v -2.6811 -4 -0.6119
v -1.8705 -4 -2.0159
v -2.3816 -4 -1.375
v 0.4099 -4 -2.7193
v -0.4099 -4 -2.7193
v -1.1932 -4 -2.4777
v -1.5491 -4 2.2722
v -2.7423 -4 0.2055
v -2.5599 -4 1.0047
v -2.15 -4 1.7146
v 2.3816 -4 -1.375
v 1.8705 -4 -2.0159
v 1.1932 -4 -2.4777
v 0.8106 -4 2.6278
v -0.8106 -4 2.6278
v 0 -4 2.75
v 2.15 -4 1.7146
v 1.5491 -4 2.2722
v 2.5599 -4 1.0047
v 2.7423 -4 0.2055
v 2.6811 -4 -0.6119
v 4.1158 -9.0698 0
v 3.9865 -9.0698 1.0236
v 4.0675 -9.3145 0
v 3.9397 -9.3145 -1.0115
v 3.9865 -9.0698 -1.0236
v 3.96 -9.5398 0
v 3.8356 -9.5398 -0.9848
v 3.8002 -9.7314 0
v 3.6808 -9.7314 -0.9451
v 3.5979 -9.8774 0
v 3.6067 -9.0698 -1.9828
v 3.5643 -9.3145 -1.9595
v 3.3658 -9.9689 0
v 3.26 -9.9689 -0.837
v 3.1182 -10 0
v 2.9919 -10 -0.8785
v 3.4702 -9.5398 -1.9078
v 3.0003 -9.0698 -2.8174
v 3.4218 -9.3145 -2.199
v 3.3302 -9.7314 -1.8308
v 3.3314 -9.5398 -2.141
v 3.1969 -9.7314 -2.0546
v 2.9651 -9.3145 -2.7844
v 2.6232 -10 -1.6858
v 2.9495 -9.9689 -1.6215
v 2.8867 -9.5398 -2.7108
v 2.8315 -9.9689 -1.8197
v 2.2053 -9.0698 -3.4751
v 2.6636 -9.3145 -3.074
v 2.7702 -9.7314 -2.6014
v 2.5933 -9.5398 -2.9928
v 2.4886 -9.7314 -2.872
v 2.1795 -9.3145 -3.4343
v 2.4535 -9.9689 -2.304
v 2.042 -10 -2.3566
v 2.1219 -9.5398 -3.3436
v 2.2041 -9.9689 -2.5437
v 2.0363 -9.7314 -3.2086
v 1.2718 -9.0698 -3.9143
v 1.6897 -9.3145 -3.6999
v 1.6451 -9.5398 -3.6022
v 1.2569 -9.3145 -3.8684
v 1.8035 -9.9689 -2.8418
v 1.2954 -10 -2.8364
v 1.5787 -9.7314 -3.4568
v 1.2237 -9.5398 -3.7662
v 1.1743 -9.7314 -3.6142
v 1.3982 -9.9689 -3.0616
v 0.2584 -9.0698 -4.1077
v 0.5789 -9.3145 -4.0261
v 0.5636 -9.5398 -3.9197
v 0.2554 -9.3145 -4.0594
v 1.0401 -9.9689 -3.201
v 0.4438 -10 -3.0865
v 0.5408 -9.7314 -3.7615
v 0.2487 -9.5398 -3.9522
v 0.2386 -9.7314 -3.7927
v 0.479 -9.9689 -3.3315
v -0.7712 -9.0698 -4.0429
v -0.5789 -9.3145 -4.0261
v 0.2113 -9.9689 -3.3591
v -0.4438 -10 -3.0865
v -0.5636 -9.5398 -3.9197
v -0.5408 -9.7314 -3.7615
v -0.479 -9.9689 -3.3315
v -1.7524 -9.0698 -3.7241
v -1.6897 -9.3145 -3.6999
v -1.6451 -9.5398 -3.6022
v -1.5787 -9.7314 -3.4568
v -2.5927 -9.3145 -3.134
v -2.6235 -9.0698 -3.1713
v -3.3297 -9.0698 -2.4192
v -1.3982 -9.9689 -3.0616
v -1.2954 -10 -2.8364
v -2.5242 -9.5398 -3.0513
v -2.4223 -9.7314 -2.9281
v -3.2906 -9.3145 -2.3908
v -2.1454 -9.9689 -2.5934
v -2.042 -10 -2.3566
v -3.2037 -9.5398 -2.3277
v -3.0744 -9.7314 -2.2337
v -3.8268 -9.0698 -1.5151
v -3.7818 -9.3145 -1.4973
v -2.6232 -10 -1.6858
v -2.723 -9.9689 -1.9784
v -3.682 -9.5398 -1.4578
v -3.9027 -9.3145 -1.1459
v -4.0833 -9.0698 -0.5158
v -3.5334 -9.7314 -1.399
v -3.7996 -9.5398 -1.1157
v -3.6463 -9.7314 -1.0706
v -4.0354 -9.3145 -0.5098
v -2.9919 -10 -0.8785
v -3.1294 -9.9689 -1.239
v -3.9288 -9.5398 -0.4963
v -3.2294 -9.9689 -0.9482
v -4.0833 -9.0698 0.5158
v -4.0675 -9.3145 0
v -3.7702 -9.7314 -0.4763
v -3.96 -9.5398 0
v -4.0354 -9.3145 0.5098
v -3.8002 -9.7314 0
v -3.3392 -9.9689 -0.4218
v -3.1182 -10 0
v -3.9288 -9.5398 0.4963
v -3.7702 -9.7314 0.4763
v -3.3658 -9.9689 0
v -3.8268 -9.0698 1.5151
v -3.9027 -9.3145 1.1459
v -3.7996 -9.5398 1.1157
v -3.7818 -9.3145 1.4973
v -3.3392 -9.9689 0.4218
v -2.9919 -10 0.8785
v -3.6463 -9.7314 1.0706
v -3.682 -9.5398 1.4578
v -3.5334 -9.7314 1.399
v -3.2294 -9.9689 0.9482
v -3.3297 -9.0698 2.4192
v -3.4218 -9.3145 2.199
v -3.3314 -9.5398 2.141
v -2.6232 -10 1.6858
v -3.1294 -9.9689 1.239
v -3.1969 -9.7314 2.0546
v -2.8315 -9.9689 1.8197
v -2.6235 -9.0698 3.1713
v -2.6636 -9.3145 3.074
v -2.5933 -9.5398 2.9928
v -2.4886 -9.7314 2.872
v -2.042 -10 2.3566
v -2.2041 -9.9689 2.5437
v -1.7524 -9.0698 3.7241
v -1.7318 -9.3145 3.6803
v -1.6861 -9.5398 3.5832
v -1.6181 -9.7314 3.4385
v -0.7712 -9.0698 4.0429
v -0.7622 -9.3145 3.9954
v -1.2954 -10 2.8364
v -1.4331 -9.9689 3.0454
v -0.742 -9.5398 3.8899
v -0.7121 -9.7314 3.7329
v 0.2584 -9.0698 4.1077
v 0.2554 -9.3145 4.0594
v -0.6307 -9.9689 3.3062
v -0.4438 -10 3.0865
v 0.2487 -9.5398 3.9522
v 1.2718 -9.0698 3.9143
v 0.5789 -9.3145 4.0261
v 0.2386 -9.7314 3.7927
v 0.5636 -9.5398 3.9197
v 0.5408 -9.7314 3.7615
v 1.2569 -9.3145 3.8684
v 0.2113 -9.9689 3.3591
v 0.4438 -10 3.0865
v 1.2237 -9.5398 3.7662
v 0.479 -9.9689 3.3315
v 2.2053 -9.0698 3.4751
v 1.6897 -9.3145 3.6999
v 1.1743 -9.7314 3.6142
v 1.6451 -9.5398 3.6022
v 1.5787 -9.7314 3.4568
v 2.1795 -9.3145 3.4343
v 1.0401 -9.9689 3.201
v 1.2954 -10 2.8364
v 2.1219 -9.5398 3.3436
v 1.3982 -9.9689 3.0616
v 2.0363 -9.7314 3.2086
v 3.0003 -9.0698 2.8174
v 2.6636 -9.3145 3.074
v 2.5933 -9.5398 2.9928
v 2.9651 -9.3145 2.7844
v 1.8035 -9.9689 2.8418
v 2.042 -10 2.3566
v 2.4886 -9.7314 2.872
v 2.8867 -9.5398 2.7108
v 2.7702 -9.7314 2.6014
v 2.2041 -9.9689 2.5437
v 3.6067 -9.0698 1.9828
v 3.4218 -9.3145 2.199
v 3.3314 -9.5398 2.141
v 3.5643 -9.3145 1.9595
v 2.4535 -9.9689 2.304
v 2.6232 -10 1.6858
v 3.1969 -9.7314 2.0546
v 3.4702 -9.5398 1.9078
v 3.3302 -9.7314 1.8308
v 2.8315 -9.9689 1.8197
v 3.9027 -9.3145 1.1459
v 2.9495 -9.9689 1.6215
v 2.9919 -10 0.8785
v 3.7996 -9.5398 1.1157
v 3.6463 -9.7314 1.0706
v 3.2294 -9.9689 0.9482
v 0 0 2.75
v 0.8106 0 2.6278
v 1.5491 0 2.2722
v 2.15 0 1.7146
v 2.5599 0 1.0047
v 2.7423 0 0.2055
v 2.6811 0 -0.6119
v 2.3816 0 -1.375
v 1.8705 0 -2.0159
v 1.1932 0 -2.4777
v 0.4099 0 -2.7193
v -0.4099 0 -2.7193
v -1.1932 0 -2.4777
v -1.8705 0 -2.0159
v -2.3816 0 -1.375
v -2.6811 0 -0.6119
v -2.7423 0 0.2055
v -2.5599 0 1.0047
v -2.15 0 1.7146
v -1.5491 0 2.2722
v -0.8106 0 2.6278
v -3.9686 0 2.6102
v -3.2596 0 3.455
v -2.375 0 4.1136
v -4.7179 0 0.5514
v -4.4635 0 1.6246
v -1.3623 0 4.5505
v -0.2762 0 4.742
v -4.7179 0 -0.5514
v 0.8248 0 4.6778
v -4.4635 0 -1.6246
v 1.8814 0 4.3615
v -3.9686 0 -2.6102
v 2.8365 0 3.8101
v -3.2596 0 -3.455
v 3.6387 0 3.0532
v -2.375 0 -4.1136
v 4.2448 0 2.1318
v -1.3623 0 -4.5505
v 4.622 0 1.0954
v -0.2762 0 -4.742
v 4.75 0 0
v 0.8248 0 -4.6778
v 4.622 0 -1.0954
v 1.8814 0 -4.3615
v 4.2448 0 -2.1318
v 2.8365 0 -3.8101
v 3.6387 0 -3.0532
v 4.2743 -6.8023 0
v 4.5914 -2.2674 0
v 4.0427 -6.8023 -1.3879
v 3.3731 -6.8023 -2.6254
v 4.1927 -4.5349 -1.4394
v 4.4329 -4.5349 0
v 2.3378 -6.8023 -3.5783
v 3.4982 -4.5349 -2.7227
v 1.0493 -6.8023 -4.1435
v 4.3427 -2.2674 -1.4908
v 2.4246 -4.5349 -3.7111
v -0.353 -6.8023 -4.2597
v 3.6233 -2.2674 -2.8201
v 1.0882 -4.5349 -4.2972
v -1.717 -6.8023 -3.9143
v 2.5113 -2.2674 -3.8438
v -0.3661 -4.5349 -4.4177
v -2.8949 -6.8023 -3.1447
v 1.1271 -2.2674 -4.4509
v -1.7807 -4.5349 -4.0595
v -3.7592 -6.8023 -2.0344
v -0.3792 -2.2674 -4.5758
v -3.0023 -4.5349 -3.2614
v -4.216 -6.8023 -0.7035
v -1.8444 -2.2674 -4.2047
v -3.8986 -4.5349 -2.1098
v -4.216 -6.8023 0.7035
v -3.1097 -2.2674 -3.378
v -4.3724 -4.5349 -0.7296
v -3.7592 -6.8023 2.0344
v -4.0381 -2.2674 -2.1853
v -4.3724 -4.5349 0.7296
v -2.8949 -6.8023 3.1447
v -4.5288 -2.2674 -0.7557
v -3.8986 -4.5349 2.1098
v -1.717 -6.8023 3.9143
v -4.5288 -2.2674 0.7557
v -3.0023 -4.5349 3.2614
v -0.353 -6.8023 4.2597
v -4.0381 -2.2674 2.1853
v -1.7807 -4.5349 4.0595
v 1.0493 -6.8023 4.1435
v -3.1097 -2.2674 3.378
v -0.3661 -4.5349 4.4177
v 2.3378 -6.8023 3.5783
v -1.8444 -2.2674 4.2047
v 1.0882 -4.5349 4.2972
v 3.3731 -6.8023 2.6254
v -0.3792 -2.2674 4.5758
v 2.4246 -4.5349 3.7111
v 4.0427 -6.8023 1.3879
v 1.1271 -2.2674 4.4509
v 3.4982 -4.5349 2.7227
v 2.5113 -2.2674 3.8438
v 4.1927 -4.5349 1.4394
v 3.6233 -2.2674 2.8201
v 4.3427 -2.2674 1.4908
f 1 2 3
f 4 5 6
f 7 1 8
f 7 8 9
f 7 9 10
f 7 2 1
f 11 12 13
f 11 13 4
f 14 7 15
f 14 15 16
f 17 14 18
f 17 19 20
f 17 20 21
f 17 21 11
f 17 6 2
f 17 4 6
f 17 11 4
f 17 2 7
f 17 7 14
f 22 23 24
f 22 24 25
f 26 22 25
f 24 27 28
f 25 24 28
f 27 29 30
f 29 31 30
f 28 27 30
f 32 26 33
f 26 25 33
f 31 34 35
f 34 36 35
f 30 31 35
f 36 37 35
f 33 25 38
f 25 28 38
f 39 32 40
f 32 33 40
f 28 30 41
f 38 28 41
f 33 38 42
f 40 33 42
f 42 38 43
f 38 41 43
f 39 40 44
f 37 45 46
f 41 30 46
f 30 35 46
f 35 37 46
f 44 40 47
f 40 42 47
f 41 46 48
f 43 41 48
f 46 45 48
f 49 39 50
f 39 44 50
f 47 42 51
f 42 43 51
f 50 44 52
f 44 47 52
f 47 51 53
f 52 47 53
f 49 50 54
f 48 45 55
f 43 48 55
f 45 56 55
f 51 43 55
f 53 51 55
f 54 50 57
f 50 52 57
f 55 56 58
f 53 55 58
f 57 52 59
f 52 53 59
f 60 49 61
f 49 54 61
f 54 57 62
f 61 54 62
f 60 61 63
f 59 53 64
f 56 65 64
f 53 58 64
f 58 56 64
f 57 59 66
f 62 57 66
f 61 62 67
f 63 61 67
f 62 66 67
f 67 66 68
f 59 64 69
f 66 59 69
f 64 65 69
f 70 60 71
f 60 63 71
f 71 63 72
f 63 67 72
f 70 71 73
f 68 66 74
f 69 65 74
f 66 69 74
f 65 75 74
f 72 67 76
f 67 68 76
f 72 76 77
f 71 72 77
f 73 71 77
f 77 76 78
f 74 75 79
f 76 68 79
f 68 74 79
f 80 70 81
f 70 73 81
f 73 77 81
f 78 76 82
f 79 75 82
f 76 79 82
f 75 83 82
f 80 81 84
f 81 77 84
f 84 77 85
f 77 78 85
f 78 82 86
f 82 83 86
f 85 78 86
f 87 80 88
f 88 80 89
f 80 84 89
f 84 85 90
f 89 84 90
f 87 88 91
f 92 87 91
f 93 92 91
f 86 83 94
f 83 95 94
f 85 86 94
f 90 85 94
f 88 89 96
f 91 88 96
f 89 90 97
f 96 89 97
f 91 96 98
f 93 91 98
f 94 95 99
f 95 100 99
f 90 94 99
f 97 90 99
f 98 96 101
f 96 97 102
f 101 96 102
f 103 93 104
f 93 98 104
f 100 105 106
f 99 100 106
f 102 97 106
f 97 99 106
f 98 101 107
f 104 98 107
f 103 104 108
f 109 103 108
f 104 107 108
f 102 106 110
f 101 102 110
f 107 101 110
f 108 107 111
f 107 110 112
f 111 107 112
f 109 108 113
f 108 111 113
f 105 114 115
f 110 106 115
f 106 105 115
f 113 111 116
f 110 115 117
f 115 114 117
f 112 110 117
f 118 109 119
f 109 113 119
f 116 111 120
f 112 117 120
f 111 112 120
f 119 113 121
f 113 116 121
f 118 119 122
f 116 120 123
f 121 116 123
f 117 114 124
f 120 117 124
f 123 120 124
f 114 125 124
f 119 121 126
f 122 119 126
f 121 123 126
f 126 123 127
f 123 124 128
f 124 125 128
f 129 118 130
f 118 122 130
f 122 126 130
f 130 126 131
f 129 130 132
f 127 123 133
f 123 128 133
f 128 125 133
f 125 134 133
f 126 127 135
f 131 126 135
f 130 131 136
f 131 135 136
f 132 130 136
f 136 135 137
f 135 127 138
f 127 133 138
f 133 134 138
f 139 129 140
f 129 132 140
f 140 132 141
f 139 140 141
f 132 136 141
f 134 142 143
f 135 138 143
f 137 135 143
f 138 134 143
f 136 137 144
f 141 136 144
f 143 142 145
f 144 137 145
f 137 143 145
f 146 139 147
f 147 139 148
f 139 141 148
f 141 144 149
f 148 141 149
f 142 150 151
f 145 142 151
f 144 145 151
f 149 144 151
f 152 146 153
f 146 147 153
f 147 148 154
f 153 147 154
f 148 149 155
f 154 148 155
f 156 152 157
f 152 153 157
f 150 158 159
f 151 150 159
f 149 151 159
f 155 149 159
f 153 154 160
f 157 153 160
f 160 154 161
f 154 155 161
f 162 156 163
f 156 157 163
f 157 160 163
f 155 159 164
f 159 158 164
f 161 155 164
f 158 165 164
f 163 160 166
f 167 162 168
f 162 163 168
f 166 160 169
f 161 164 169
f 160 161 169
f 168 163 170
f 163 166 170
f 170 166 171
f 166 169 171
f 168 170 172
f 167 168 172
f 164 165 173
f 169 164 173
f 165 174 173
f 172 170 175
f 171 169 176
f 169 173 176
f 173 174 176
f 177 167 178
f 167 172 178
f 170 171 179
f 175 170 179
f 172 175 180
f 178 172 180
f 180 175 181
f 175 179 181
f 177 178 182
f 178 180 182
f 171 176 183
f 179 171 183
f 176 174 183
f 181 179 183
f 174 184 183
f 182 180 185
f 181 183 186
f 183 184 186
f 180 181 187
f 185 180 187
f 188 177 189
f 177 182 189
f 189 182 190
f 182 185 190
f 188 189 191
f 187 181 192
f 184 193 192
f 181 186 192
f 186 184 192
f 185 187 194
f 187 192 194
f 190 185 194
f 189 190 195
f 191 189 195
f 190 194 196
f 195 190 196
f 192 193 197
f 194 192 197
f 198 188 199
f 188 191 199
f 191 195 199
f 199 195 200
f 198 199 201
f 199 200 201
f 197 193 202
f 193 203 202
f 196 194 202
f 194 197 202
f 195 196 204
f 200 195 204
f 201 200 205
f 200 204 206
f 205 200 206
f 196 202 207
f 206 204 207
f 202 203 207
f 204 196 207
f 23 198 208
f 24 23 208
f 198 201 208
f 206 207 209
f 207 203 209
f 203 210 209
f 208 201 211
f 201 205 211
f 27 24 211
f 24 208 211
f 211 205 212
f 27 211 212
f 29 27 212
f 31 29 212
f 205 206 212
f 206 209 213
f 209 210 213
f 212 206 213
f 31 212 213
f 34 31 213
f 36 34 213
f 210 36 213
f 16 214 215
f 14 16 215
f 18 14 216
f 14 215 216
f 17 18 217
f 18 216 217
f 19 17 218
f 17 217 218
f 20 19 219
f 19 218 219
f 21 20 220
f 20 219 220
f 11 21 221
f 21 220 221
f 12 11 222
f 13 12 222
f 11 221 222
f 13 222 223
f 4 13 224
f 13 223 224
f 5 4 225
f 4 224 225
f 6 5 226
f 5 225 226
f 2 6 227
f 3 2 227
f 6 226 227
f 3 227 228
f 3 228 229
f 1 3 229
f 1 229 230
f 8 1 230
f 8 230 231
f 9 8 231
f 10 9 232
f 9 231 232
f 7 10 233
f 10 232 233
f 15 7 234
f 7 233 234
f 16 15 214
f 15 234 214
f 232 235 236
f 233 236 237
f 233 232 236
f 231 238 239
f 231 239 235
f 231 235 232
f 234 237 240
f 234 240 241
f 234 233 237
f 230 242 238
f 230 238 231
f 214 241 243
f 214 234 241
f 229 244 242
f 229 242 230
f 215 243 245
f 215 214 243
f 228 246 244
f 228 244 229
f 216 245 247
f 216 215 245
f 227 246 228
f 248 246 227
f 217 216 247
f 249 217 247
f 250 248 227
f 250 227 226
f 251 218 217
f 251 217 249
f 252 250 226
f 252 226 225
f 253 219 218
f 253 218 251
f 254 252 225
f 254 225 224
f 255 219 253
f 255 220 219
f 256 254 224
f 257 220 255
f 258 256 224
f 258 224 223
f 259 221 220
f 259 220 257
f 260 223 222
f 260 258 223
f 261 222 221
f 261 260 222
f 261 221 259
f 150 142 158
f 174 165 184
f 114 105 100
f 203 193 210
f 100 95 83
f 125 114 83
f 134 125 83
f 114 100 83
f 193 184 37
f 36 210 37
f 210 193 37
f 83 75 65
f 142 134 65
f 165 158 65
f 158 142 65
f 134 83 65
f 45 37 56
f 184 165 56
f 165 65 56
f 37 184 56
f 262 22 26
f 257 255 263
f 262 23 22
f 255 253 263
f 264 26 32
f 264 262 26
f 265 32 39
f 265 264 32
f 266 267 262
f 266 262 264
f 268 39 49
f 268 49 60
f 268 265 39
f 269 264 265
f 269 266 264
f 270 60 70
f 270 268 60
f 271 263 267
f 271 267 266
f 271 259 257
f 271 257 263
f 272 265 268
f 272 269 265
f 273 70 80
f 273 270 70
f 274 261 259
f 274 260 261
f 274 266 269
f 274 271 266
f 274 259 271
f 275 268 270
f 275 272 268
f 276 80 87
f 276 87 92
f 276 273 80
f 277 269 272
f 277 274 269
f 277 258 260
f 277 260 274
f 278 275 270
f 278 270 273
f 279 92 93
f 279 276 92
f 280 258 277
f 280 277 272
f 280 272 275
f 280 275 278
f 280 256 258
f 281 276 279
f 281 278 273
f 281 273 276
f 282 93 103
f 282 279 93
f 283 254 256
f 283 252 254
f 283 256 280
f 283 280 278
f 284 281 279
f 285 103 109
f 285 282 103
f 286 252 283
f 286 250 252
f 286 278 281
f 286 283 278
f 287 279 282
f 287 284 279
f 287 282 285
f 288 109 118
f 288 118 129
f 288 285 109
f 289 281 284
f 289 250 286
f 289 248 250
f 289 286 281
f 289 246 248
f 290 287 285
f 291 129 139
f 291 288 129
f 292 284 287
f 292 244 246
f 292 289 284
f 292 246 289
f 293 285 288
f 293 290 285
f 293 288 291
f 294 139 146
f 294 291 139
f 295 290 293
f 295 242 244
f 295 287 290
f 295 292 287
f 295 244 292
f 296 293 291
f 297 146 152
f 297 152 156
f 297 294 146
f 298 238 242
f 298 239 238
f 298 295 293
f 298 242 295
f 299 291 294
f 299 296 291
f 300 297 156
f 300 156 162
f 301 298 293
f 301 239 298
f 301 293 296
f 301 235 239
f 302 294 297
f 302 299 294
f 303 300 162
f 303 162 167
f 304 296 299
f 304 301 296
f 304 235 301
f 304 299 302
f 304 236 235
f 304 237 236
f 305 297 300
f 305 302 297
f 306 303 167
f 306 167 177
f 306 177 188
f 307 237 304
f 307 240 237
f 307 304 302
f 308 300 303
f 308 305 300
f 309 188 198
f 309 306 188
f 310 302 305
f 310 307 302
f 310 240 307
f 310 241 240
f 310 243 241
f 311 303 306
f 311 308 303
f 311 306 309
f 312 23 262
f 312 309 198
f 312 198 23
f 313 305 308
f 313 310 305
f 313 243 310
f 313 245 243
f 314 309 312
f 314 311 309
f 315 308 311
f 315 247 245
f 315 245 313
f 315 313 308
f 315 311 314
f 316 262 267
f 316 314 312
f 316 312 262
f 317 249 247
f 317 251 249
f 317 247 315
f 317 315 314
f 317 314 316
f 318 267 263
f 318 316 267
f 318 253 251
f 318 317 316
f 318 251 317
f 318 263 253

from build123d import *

# Parameters (mm, degrees)
SKETCH1_R           = 4.75
BOSS_EXTRUDE1_DEPTH = 10
BOSS_EXTRUDE1_DRAFT = -4
SKETCH2_R           = 2.75
CUT_EXTRUDE1_DEPTH  = 4
FILLET1_R           = 1


with BuildPart() as part:
    # Sketch1 → Boss-Extrude1 (with draft: the straight prism first)
    with BuildSketch(Plane(origin=(0, 0, 0), x_dir=(1, 0, 0), z_dir=(0, 1, 0))):
        Circle(SKETCH1_R)
    extrude(amount=-BOSS_EXTRUDE1_DEPTH)
    # Boss-Extrude1: the draft: its side faces are tilted about the plane it starts from
    boss_extrude1_sides = [part.faces().sort_by_distance(p)[0] for p in [
        (-4.75, -5, 0),
    ]]
    draft(boss_extrude1_sides, Plane(origin=(0, 0, 0), x_dir=(1, 0, 0), z_dir=(0, 1, 0)), BOSS_EXTRUDE1_DRAFT)

    # Sketch2 → Cut-Extrude1 (cut)
    with BuildSketch(Plane(origin=(0, 0, 0), x_dir=(1, 0, 0), z_dir=(0, 1, 0))):
        with Locations(Location((0, 0, 0), (0, 0, 270))):
            Circle(SKETCH2_R)
    extrude(amount=-CUT_EXTRUDE1_DEPTH, mode=Mode.SUBTRACT)

    # Fillet1
    fillet1_edges = [part.edges().sort_by_distance(p)[0] for p in [
        (-4.050731881, -10, 0),
    ]]
    fillet(fillet1_edges, radius=FILLET1_R)


solid = part.part
